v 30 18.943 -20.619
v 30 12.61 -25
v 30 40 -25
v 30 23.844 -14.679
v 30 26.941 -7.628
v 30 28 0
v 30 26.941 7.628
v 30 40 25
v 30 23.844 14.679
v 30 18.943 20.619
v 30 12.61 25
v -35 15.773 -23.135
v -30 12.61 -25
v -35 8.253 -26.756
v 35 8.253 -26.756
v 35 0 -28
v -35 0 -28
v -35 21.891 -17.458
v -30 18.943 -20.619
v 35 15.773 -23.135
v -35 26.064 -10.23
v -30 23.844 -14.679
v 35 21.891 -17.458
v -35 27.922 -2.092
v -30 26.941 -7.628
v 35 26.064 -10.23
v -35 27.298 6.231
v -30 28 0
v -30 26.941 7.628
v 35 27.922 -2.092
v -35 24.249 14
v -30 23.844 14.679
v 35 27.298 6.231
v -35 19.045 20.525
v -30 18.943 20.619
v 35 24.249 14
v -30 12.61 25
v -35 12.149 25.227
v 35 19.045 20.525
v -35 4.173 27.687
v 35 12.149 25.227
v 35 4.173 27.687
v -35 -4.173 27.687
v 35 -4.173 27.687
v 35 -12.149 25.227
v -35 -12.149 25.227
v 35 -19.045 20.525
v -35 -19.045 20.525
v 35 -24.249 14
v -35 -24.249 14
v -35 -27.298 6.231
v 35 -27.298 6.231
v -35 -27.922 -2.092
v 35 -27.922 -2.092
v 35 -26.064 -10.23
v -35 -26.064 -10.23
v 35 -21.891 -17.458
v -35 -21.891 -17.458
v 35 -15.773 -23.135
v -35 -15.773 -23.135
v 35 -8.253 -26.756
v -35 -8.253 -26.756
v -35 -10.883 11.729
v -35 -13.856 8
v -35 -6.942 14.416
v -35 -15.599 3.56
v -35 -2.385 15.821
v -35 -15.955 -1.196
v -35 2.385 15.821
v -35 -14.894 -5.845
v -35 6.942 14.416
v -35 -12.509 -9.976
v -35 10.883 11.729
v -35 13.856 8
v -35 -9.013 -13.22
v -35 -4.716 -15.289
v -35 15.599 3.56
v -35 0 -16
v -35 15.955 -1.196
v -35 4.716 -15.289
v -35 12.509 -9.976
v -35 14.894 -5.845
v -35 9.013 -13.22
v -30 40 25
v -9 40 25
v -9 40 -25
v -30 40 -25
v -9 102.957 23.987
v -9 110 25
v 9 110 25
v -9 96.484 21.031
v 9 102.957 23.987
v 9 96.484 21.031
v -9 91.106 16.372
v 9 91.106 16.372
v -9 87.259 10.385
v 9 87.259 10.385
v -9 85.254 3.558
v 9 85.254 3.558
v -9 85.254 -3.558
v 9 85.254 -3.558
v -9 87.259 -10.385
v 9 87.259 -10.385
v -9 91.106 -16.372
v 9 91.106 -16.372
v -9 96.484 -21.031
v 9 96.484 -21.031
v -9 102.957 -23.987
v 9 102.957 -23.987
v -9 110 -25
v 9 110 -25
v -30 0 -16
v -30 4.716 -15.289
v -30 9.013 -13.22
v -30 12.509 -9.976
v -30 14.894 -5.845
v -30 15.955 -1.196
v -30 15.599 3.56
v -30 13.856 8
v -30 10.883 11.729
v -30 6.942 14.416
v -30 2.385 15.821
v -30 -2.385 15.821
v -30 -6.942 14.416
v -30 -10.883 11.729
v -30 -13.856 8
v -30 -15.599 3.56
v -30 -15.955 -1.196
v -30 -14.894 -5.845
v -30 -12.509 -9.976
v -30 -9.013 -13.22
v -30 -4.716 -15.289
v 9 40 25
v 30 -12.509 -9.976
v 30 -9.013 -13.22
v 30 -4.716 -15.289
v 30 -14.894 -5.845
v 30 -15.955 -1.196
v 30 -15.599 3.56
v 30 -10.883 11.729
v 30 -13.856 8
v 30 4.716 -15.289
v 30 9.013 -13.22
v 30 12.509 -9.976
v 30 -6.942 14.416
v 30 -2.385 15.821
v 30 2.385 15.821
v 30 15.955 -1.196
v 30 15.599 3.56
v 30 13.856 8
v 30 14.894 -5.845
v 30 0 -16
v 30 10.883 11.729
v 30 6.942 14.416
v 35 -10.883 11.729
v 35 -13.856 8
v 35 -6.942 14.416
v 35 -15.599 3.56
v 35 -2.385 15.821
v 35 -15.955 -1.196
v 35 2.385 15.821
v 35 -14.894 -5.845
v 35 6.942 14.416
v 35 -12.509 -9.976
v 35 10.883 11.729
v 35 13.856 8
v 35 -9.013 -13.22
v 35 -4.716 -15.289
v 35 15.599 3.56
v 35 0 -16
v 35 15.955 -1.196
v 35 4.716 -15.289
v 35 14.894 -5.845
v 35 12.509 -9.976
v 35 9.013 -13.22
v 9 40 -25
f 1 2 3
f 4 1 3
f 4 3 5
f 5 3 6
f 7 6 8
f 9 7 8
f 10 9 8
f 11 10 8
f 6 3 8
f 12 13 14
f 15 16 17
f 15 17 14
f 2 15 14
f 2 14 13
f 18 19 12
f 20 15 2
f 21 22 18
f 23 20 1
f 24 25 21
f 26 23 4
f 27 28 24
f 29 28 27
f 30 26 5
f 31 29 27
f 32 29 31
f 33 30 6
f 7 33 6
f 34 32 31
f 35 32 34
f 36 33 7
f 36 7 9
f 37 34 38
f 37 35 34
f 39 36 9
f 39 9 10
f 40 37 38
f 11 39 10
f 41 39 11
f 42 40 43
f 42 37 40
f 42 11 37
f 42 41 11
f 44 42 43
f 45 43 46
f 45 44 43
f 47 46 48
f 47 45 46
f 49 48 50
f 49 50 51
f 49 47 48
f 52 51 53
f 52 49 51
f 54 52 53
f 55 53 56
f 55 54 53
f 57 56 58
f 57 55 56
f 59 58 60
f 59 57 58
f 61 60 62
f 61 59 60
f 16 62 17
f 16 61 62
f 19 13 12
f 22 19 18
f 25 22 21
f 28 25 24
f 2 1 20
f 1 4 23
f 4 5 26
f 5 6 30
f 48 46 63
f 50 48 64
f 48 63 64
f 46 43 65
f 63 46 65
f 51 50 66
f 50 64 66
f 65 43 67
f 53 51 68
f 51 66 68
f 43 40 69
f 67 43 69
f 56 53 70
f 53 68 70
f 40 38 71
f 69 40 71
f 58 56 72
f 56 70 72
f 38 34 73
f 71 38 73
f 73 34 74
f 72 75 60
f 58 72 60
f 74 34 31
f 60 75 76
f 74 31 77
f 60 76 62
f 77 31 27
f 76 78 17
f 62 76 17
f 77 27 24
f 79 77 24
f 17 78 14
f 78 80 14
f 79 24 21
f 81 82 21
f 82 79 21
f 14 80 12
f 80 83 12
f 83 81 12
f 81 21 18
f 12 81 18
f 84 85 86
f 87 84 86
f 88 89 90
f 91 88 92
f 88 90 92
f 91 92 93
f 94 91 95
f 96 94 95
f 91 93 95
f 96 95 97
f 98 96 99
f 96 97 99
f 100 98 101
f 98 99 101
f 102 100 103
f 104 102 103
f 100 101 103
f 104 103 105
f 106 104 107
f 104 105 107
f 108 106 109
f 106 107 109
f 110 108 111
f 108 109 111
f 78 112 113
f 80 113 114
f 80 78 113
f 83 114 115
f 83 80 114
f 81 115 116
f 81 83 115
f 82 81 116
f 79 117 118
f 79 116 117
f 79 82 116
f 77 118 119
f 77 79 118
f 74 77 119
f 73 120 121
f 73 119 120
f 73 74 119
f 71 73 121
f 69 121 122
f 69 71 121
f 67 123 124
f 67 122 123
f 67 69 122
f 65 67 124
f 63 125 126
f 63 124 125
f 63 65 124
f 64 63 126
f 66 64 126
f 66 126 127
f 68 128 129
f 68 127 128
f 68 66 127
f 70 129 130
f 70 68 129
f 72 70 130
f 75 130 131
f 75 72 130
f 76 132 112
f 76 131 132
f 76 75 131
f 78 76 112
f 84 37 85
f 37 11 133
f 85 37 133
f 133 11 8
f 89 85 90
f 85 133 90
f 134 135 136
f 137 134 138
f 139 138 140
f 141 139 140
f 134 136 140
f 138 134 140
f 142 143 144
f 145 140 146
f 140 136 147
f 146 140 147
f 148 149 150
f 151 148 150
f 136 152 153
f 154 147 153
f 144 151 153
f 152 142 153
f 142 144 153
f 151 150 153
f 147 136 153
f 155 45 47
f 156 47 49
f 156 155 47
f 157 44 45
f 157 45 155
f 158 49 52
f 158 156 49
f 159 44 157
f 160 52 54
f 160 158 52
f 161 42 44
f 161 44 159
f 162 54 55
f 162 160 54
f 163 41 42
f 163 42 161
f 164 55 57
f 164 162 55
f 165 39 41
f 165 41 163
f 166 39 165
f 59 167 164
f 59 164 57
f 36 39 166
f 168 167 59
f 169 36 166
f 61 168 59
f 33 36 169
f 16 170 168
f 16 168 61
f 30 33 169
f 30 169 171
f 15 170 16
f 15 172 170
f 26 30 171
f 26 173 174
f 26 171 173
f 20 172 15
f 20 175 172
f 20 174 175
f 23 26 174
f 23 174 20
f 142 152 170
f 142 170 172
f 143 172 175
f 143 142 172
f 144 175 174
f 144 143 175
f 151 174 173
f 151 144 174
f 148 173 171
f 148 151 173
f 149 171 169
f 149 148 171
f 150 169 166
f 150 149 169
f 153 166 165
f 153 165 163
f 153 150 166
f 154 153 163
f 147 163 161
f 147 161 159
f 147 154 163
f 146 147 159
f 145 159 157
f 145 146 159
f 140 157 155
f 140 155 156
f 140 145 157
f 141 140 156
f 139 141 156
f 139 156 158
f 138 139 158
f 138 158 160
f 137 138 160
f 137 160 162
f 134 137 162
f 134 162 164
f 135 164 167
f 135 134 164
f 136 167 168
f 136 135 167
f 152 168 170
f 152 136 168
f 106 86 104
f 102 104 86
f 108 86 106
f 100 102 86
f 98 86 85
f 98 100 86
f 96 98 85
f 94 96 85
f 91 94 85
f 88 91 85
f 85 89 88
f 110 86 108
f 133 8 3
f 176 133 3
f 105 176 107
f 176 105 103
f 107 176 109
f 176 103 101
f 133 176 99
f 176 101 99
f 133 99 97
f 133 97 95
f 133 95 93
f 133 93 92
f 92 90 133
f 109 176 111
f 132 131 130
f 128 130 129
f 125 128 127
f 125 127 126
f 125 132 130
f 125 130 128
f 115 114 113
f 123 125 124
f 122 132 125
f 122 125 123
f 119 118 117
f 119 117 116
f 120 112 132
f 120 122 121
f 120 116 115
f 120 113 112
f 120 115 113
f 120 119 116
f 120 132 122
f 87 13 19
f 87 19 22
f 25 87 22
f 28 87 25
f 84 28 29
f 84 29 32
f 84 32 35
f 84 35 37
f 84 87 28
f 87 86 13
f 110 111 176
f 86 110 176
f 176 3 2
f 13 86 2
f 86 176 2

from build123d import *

# Parameters (mm, degrees)
SKETCH1_R           = 28
SKETCH1_R_2         = 16
BOSS_EXTRUDE1_DEPTH = 35
BOSS_EXTRUDE2_DEPTH = 30
BOSS_EXTRUDE3_DEPTH = 9


with BuildPart() as part:
    # Sketch1 → Boss-Extrude1 (new, symmetric)
    with BuildSketch(Plane(origin=(0, 0, 0), x_dir=(0, 0, -1), z_dir=(1, 0, 0))):
        Circle(SKETCH1_R)
        Circle(SKETCH1_R_2, mode=Mode.SUBTRACT)
    extrude(amount=BOSS_EXTRUDE1_DEPTH, both=True)

    # Sketch2 → Boss-Extrude2 (add, symmetric)
    with BuildSketch(Plane(origin=(0, 0, 0), x_dir=(0, 0, -1), z_dir=(1, 0, 0))):
        with BuildLine():
            Line((-25, 40), (25, 40))
            Line((25, 40), (25, 12.609520213))
            ThreePointArc((25, 12.609520213), (0, -28), (-25, 12.609520213))
            Line((-25, 12.609520213), (-25, 40))
        make_face()
    extrude(amount=BOSS_EXTRUDE2_DEPTH, both=True)

    # Sketch3 → Boss-Extrude3 (add, symmetric)
    with BuildSketch(Plane(origin=(0, 0, 0), x_dir=(0, 0, -1), z_dir=(1, 0, 0))):
        with BuildLine():
            Line((-25, 40), (-25, 110))
            ThreePointArc((-25, 110), (0, 85), (25, 110))
            Line((25, 110), (25, 40))
            Line((25, 40), (25, 12.609520213))
            ThreePointArc((25, 12.609520213), (0, 28), (-25, 12.609520213))
            Line((-25, 12.609520213), (-25, 40))
        make_face()
    extrude(amount=BOSS_EXTRUDE3_DEPTH, both=True)


solid = part.part
